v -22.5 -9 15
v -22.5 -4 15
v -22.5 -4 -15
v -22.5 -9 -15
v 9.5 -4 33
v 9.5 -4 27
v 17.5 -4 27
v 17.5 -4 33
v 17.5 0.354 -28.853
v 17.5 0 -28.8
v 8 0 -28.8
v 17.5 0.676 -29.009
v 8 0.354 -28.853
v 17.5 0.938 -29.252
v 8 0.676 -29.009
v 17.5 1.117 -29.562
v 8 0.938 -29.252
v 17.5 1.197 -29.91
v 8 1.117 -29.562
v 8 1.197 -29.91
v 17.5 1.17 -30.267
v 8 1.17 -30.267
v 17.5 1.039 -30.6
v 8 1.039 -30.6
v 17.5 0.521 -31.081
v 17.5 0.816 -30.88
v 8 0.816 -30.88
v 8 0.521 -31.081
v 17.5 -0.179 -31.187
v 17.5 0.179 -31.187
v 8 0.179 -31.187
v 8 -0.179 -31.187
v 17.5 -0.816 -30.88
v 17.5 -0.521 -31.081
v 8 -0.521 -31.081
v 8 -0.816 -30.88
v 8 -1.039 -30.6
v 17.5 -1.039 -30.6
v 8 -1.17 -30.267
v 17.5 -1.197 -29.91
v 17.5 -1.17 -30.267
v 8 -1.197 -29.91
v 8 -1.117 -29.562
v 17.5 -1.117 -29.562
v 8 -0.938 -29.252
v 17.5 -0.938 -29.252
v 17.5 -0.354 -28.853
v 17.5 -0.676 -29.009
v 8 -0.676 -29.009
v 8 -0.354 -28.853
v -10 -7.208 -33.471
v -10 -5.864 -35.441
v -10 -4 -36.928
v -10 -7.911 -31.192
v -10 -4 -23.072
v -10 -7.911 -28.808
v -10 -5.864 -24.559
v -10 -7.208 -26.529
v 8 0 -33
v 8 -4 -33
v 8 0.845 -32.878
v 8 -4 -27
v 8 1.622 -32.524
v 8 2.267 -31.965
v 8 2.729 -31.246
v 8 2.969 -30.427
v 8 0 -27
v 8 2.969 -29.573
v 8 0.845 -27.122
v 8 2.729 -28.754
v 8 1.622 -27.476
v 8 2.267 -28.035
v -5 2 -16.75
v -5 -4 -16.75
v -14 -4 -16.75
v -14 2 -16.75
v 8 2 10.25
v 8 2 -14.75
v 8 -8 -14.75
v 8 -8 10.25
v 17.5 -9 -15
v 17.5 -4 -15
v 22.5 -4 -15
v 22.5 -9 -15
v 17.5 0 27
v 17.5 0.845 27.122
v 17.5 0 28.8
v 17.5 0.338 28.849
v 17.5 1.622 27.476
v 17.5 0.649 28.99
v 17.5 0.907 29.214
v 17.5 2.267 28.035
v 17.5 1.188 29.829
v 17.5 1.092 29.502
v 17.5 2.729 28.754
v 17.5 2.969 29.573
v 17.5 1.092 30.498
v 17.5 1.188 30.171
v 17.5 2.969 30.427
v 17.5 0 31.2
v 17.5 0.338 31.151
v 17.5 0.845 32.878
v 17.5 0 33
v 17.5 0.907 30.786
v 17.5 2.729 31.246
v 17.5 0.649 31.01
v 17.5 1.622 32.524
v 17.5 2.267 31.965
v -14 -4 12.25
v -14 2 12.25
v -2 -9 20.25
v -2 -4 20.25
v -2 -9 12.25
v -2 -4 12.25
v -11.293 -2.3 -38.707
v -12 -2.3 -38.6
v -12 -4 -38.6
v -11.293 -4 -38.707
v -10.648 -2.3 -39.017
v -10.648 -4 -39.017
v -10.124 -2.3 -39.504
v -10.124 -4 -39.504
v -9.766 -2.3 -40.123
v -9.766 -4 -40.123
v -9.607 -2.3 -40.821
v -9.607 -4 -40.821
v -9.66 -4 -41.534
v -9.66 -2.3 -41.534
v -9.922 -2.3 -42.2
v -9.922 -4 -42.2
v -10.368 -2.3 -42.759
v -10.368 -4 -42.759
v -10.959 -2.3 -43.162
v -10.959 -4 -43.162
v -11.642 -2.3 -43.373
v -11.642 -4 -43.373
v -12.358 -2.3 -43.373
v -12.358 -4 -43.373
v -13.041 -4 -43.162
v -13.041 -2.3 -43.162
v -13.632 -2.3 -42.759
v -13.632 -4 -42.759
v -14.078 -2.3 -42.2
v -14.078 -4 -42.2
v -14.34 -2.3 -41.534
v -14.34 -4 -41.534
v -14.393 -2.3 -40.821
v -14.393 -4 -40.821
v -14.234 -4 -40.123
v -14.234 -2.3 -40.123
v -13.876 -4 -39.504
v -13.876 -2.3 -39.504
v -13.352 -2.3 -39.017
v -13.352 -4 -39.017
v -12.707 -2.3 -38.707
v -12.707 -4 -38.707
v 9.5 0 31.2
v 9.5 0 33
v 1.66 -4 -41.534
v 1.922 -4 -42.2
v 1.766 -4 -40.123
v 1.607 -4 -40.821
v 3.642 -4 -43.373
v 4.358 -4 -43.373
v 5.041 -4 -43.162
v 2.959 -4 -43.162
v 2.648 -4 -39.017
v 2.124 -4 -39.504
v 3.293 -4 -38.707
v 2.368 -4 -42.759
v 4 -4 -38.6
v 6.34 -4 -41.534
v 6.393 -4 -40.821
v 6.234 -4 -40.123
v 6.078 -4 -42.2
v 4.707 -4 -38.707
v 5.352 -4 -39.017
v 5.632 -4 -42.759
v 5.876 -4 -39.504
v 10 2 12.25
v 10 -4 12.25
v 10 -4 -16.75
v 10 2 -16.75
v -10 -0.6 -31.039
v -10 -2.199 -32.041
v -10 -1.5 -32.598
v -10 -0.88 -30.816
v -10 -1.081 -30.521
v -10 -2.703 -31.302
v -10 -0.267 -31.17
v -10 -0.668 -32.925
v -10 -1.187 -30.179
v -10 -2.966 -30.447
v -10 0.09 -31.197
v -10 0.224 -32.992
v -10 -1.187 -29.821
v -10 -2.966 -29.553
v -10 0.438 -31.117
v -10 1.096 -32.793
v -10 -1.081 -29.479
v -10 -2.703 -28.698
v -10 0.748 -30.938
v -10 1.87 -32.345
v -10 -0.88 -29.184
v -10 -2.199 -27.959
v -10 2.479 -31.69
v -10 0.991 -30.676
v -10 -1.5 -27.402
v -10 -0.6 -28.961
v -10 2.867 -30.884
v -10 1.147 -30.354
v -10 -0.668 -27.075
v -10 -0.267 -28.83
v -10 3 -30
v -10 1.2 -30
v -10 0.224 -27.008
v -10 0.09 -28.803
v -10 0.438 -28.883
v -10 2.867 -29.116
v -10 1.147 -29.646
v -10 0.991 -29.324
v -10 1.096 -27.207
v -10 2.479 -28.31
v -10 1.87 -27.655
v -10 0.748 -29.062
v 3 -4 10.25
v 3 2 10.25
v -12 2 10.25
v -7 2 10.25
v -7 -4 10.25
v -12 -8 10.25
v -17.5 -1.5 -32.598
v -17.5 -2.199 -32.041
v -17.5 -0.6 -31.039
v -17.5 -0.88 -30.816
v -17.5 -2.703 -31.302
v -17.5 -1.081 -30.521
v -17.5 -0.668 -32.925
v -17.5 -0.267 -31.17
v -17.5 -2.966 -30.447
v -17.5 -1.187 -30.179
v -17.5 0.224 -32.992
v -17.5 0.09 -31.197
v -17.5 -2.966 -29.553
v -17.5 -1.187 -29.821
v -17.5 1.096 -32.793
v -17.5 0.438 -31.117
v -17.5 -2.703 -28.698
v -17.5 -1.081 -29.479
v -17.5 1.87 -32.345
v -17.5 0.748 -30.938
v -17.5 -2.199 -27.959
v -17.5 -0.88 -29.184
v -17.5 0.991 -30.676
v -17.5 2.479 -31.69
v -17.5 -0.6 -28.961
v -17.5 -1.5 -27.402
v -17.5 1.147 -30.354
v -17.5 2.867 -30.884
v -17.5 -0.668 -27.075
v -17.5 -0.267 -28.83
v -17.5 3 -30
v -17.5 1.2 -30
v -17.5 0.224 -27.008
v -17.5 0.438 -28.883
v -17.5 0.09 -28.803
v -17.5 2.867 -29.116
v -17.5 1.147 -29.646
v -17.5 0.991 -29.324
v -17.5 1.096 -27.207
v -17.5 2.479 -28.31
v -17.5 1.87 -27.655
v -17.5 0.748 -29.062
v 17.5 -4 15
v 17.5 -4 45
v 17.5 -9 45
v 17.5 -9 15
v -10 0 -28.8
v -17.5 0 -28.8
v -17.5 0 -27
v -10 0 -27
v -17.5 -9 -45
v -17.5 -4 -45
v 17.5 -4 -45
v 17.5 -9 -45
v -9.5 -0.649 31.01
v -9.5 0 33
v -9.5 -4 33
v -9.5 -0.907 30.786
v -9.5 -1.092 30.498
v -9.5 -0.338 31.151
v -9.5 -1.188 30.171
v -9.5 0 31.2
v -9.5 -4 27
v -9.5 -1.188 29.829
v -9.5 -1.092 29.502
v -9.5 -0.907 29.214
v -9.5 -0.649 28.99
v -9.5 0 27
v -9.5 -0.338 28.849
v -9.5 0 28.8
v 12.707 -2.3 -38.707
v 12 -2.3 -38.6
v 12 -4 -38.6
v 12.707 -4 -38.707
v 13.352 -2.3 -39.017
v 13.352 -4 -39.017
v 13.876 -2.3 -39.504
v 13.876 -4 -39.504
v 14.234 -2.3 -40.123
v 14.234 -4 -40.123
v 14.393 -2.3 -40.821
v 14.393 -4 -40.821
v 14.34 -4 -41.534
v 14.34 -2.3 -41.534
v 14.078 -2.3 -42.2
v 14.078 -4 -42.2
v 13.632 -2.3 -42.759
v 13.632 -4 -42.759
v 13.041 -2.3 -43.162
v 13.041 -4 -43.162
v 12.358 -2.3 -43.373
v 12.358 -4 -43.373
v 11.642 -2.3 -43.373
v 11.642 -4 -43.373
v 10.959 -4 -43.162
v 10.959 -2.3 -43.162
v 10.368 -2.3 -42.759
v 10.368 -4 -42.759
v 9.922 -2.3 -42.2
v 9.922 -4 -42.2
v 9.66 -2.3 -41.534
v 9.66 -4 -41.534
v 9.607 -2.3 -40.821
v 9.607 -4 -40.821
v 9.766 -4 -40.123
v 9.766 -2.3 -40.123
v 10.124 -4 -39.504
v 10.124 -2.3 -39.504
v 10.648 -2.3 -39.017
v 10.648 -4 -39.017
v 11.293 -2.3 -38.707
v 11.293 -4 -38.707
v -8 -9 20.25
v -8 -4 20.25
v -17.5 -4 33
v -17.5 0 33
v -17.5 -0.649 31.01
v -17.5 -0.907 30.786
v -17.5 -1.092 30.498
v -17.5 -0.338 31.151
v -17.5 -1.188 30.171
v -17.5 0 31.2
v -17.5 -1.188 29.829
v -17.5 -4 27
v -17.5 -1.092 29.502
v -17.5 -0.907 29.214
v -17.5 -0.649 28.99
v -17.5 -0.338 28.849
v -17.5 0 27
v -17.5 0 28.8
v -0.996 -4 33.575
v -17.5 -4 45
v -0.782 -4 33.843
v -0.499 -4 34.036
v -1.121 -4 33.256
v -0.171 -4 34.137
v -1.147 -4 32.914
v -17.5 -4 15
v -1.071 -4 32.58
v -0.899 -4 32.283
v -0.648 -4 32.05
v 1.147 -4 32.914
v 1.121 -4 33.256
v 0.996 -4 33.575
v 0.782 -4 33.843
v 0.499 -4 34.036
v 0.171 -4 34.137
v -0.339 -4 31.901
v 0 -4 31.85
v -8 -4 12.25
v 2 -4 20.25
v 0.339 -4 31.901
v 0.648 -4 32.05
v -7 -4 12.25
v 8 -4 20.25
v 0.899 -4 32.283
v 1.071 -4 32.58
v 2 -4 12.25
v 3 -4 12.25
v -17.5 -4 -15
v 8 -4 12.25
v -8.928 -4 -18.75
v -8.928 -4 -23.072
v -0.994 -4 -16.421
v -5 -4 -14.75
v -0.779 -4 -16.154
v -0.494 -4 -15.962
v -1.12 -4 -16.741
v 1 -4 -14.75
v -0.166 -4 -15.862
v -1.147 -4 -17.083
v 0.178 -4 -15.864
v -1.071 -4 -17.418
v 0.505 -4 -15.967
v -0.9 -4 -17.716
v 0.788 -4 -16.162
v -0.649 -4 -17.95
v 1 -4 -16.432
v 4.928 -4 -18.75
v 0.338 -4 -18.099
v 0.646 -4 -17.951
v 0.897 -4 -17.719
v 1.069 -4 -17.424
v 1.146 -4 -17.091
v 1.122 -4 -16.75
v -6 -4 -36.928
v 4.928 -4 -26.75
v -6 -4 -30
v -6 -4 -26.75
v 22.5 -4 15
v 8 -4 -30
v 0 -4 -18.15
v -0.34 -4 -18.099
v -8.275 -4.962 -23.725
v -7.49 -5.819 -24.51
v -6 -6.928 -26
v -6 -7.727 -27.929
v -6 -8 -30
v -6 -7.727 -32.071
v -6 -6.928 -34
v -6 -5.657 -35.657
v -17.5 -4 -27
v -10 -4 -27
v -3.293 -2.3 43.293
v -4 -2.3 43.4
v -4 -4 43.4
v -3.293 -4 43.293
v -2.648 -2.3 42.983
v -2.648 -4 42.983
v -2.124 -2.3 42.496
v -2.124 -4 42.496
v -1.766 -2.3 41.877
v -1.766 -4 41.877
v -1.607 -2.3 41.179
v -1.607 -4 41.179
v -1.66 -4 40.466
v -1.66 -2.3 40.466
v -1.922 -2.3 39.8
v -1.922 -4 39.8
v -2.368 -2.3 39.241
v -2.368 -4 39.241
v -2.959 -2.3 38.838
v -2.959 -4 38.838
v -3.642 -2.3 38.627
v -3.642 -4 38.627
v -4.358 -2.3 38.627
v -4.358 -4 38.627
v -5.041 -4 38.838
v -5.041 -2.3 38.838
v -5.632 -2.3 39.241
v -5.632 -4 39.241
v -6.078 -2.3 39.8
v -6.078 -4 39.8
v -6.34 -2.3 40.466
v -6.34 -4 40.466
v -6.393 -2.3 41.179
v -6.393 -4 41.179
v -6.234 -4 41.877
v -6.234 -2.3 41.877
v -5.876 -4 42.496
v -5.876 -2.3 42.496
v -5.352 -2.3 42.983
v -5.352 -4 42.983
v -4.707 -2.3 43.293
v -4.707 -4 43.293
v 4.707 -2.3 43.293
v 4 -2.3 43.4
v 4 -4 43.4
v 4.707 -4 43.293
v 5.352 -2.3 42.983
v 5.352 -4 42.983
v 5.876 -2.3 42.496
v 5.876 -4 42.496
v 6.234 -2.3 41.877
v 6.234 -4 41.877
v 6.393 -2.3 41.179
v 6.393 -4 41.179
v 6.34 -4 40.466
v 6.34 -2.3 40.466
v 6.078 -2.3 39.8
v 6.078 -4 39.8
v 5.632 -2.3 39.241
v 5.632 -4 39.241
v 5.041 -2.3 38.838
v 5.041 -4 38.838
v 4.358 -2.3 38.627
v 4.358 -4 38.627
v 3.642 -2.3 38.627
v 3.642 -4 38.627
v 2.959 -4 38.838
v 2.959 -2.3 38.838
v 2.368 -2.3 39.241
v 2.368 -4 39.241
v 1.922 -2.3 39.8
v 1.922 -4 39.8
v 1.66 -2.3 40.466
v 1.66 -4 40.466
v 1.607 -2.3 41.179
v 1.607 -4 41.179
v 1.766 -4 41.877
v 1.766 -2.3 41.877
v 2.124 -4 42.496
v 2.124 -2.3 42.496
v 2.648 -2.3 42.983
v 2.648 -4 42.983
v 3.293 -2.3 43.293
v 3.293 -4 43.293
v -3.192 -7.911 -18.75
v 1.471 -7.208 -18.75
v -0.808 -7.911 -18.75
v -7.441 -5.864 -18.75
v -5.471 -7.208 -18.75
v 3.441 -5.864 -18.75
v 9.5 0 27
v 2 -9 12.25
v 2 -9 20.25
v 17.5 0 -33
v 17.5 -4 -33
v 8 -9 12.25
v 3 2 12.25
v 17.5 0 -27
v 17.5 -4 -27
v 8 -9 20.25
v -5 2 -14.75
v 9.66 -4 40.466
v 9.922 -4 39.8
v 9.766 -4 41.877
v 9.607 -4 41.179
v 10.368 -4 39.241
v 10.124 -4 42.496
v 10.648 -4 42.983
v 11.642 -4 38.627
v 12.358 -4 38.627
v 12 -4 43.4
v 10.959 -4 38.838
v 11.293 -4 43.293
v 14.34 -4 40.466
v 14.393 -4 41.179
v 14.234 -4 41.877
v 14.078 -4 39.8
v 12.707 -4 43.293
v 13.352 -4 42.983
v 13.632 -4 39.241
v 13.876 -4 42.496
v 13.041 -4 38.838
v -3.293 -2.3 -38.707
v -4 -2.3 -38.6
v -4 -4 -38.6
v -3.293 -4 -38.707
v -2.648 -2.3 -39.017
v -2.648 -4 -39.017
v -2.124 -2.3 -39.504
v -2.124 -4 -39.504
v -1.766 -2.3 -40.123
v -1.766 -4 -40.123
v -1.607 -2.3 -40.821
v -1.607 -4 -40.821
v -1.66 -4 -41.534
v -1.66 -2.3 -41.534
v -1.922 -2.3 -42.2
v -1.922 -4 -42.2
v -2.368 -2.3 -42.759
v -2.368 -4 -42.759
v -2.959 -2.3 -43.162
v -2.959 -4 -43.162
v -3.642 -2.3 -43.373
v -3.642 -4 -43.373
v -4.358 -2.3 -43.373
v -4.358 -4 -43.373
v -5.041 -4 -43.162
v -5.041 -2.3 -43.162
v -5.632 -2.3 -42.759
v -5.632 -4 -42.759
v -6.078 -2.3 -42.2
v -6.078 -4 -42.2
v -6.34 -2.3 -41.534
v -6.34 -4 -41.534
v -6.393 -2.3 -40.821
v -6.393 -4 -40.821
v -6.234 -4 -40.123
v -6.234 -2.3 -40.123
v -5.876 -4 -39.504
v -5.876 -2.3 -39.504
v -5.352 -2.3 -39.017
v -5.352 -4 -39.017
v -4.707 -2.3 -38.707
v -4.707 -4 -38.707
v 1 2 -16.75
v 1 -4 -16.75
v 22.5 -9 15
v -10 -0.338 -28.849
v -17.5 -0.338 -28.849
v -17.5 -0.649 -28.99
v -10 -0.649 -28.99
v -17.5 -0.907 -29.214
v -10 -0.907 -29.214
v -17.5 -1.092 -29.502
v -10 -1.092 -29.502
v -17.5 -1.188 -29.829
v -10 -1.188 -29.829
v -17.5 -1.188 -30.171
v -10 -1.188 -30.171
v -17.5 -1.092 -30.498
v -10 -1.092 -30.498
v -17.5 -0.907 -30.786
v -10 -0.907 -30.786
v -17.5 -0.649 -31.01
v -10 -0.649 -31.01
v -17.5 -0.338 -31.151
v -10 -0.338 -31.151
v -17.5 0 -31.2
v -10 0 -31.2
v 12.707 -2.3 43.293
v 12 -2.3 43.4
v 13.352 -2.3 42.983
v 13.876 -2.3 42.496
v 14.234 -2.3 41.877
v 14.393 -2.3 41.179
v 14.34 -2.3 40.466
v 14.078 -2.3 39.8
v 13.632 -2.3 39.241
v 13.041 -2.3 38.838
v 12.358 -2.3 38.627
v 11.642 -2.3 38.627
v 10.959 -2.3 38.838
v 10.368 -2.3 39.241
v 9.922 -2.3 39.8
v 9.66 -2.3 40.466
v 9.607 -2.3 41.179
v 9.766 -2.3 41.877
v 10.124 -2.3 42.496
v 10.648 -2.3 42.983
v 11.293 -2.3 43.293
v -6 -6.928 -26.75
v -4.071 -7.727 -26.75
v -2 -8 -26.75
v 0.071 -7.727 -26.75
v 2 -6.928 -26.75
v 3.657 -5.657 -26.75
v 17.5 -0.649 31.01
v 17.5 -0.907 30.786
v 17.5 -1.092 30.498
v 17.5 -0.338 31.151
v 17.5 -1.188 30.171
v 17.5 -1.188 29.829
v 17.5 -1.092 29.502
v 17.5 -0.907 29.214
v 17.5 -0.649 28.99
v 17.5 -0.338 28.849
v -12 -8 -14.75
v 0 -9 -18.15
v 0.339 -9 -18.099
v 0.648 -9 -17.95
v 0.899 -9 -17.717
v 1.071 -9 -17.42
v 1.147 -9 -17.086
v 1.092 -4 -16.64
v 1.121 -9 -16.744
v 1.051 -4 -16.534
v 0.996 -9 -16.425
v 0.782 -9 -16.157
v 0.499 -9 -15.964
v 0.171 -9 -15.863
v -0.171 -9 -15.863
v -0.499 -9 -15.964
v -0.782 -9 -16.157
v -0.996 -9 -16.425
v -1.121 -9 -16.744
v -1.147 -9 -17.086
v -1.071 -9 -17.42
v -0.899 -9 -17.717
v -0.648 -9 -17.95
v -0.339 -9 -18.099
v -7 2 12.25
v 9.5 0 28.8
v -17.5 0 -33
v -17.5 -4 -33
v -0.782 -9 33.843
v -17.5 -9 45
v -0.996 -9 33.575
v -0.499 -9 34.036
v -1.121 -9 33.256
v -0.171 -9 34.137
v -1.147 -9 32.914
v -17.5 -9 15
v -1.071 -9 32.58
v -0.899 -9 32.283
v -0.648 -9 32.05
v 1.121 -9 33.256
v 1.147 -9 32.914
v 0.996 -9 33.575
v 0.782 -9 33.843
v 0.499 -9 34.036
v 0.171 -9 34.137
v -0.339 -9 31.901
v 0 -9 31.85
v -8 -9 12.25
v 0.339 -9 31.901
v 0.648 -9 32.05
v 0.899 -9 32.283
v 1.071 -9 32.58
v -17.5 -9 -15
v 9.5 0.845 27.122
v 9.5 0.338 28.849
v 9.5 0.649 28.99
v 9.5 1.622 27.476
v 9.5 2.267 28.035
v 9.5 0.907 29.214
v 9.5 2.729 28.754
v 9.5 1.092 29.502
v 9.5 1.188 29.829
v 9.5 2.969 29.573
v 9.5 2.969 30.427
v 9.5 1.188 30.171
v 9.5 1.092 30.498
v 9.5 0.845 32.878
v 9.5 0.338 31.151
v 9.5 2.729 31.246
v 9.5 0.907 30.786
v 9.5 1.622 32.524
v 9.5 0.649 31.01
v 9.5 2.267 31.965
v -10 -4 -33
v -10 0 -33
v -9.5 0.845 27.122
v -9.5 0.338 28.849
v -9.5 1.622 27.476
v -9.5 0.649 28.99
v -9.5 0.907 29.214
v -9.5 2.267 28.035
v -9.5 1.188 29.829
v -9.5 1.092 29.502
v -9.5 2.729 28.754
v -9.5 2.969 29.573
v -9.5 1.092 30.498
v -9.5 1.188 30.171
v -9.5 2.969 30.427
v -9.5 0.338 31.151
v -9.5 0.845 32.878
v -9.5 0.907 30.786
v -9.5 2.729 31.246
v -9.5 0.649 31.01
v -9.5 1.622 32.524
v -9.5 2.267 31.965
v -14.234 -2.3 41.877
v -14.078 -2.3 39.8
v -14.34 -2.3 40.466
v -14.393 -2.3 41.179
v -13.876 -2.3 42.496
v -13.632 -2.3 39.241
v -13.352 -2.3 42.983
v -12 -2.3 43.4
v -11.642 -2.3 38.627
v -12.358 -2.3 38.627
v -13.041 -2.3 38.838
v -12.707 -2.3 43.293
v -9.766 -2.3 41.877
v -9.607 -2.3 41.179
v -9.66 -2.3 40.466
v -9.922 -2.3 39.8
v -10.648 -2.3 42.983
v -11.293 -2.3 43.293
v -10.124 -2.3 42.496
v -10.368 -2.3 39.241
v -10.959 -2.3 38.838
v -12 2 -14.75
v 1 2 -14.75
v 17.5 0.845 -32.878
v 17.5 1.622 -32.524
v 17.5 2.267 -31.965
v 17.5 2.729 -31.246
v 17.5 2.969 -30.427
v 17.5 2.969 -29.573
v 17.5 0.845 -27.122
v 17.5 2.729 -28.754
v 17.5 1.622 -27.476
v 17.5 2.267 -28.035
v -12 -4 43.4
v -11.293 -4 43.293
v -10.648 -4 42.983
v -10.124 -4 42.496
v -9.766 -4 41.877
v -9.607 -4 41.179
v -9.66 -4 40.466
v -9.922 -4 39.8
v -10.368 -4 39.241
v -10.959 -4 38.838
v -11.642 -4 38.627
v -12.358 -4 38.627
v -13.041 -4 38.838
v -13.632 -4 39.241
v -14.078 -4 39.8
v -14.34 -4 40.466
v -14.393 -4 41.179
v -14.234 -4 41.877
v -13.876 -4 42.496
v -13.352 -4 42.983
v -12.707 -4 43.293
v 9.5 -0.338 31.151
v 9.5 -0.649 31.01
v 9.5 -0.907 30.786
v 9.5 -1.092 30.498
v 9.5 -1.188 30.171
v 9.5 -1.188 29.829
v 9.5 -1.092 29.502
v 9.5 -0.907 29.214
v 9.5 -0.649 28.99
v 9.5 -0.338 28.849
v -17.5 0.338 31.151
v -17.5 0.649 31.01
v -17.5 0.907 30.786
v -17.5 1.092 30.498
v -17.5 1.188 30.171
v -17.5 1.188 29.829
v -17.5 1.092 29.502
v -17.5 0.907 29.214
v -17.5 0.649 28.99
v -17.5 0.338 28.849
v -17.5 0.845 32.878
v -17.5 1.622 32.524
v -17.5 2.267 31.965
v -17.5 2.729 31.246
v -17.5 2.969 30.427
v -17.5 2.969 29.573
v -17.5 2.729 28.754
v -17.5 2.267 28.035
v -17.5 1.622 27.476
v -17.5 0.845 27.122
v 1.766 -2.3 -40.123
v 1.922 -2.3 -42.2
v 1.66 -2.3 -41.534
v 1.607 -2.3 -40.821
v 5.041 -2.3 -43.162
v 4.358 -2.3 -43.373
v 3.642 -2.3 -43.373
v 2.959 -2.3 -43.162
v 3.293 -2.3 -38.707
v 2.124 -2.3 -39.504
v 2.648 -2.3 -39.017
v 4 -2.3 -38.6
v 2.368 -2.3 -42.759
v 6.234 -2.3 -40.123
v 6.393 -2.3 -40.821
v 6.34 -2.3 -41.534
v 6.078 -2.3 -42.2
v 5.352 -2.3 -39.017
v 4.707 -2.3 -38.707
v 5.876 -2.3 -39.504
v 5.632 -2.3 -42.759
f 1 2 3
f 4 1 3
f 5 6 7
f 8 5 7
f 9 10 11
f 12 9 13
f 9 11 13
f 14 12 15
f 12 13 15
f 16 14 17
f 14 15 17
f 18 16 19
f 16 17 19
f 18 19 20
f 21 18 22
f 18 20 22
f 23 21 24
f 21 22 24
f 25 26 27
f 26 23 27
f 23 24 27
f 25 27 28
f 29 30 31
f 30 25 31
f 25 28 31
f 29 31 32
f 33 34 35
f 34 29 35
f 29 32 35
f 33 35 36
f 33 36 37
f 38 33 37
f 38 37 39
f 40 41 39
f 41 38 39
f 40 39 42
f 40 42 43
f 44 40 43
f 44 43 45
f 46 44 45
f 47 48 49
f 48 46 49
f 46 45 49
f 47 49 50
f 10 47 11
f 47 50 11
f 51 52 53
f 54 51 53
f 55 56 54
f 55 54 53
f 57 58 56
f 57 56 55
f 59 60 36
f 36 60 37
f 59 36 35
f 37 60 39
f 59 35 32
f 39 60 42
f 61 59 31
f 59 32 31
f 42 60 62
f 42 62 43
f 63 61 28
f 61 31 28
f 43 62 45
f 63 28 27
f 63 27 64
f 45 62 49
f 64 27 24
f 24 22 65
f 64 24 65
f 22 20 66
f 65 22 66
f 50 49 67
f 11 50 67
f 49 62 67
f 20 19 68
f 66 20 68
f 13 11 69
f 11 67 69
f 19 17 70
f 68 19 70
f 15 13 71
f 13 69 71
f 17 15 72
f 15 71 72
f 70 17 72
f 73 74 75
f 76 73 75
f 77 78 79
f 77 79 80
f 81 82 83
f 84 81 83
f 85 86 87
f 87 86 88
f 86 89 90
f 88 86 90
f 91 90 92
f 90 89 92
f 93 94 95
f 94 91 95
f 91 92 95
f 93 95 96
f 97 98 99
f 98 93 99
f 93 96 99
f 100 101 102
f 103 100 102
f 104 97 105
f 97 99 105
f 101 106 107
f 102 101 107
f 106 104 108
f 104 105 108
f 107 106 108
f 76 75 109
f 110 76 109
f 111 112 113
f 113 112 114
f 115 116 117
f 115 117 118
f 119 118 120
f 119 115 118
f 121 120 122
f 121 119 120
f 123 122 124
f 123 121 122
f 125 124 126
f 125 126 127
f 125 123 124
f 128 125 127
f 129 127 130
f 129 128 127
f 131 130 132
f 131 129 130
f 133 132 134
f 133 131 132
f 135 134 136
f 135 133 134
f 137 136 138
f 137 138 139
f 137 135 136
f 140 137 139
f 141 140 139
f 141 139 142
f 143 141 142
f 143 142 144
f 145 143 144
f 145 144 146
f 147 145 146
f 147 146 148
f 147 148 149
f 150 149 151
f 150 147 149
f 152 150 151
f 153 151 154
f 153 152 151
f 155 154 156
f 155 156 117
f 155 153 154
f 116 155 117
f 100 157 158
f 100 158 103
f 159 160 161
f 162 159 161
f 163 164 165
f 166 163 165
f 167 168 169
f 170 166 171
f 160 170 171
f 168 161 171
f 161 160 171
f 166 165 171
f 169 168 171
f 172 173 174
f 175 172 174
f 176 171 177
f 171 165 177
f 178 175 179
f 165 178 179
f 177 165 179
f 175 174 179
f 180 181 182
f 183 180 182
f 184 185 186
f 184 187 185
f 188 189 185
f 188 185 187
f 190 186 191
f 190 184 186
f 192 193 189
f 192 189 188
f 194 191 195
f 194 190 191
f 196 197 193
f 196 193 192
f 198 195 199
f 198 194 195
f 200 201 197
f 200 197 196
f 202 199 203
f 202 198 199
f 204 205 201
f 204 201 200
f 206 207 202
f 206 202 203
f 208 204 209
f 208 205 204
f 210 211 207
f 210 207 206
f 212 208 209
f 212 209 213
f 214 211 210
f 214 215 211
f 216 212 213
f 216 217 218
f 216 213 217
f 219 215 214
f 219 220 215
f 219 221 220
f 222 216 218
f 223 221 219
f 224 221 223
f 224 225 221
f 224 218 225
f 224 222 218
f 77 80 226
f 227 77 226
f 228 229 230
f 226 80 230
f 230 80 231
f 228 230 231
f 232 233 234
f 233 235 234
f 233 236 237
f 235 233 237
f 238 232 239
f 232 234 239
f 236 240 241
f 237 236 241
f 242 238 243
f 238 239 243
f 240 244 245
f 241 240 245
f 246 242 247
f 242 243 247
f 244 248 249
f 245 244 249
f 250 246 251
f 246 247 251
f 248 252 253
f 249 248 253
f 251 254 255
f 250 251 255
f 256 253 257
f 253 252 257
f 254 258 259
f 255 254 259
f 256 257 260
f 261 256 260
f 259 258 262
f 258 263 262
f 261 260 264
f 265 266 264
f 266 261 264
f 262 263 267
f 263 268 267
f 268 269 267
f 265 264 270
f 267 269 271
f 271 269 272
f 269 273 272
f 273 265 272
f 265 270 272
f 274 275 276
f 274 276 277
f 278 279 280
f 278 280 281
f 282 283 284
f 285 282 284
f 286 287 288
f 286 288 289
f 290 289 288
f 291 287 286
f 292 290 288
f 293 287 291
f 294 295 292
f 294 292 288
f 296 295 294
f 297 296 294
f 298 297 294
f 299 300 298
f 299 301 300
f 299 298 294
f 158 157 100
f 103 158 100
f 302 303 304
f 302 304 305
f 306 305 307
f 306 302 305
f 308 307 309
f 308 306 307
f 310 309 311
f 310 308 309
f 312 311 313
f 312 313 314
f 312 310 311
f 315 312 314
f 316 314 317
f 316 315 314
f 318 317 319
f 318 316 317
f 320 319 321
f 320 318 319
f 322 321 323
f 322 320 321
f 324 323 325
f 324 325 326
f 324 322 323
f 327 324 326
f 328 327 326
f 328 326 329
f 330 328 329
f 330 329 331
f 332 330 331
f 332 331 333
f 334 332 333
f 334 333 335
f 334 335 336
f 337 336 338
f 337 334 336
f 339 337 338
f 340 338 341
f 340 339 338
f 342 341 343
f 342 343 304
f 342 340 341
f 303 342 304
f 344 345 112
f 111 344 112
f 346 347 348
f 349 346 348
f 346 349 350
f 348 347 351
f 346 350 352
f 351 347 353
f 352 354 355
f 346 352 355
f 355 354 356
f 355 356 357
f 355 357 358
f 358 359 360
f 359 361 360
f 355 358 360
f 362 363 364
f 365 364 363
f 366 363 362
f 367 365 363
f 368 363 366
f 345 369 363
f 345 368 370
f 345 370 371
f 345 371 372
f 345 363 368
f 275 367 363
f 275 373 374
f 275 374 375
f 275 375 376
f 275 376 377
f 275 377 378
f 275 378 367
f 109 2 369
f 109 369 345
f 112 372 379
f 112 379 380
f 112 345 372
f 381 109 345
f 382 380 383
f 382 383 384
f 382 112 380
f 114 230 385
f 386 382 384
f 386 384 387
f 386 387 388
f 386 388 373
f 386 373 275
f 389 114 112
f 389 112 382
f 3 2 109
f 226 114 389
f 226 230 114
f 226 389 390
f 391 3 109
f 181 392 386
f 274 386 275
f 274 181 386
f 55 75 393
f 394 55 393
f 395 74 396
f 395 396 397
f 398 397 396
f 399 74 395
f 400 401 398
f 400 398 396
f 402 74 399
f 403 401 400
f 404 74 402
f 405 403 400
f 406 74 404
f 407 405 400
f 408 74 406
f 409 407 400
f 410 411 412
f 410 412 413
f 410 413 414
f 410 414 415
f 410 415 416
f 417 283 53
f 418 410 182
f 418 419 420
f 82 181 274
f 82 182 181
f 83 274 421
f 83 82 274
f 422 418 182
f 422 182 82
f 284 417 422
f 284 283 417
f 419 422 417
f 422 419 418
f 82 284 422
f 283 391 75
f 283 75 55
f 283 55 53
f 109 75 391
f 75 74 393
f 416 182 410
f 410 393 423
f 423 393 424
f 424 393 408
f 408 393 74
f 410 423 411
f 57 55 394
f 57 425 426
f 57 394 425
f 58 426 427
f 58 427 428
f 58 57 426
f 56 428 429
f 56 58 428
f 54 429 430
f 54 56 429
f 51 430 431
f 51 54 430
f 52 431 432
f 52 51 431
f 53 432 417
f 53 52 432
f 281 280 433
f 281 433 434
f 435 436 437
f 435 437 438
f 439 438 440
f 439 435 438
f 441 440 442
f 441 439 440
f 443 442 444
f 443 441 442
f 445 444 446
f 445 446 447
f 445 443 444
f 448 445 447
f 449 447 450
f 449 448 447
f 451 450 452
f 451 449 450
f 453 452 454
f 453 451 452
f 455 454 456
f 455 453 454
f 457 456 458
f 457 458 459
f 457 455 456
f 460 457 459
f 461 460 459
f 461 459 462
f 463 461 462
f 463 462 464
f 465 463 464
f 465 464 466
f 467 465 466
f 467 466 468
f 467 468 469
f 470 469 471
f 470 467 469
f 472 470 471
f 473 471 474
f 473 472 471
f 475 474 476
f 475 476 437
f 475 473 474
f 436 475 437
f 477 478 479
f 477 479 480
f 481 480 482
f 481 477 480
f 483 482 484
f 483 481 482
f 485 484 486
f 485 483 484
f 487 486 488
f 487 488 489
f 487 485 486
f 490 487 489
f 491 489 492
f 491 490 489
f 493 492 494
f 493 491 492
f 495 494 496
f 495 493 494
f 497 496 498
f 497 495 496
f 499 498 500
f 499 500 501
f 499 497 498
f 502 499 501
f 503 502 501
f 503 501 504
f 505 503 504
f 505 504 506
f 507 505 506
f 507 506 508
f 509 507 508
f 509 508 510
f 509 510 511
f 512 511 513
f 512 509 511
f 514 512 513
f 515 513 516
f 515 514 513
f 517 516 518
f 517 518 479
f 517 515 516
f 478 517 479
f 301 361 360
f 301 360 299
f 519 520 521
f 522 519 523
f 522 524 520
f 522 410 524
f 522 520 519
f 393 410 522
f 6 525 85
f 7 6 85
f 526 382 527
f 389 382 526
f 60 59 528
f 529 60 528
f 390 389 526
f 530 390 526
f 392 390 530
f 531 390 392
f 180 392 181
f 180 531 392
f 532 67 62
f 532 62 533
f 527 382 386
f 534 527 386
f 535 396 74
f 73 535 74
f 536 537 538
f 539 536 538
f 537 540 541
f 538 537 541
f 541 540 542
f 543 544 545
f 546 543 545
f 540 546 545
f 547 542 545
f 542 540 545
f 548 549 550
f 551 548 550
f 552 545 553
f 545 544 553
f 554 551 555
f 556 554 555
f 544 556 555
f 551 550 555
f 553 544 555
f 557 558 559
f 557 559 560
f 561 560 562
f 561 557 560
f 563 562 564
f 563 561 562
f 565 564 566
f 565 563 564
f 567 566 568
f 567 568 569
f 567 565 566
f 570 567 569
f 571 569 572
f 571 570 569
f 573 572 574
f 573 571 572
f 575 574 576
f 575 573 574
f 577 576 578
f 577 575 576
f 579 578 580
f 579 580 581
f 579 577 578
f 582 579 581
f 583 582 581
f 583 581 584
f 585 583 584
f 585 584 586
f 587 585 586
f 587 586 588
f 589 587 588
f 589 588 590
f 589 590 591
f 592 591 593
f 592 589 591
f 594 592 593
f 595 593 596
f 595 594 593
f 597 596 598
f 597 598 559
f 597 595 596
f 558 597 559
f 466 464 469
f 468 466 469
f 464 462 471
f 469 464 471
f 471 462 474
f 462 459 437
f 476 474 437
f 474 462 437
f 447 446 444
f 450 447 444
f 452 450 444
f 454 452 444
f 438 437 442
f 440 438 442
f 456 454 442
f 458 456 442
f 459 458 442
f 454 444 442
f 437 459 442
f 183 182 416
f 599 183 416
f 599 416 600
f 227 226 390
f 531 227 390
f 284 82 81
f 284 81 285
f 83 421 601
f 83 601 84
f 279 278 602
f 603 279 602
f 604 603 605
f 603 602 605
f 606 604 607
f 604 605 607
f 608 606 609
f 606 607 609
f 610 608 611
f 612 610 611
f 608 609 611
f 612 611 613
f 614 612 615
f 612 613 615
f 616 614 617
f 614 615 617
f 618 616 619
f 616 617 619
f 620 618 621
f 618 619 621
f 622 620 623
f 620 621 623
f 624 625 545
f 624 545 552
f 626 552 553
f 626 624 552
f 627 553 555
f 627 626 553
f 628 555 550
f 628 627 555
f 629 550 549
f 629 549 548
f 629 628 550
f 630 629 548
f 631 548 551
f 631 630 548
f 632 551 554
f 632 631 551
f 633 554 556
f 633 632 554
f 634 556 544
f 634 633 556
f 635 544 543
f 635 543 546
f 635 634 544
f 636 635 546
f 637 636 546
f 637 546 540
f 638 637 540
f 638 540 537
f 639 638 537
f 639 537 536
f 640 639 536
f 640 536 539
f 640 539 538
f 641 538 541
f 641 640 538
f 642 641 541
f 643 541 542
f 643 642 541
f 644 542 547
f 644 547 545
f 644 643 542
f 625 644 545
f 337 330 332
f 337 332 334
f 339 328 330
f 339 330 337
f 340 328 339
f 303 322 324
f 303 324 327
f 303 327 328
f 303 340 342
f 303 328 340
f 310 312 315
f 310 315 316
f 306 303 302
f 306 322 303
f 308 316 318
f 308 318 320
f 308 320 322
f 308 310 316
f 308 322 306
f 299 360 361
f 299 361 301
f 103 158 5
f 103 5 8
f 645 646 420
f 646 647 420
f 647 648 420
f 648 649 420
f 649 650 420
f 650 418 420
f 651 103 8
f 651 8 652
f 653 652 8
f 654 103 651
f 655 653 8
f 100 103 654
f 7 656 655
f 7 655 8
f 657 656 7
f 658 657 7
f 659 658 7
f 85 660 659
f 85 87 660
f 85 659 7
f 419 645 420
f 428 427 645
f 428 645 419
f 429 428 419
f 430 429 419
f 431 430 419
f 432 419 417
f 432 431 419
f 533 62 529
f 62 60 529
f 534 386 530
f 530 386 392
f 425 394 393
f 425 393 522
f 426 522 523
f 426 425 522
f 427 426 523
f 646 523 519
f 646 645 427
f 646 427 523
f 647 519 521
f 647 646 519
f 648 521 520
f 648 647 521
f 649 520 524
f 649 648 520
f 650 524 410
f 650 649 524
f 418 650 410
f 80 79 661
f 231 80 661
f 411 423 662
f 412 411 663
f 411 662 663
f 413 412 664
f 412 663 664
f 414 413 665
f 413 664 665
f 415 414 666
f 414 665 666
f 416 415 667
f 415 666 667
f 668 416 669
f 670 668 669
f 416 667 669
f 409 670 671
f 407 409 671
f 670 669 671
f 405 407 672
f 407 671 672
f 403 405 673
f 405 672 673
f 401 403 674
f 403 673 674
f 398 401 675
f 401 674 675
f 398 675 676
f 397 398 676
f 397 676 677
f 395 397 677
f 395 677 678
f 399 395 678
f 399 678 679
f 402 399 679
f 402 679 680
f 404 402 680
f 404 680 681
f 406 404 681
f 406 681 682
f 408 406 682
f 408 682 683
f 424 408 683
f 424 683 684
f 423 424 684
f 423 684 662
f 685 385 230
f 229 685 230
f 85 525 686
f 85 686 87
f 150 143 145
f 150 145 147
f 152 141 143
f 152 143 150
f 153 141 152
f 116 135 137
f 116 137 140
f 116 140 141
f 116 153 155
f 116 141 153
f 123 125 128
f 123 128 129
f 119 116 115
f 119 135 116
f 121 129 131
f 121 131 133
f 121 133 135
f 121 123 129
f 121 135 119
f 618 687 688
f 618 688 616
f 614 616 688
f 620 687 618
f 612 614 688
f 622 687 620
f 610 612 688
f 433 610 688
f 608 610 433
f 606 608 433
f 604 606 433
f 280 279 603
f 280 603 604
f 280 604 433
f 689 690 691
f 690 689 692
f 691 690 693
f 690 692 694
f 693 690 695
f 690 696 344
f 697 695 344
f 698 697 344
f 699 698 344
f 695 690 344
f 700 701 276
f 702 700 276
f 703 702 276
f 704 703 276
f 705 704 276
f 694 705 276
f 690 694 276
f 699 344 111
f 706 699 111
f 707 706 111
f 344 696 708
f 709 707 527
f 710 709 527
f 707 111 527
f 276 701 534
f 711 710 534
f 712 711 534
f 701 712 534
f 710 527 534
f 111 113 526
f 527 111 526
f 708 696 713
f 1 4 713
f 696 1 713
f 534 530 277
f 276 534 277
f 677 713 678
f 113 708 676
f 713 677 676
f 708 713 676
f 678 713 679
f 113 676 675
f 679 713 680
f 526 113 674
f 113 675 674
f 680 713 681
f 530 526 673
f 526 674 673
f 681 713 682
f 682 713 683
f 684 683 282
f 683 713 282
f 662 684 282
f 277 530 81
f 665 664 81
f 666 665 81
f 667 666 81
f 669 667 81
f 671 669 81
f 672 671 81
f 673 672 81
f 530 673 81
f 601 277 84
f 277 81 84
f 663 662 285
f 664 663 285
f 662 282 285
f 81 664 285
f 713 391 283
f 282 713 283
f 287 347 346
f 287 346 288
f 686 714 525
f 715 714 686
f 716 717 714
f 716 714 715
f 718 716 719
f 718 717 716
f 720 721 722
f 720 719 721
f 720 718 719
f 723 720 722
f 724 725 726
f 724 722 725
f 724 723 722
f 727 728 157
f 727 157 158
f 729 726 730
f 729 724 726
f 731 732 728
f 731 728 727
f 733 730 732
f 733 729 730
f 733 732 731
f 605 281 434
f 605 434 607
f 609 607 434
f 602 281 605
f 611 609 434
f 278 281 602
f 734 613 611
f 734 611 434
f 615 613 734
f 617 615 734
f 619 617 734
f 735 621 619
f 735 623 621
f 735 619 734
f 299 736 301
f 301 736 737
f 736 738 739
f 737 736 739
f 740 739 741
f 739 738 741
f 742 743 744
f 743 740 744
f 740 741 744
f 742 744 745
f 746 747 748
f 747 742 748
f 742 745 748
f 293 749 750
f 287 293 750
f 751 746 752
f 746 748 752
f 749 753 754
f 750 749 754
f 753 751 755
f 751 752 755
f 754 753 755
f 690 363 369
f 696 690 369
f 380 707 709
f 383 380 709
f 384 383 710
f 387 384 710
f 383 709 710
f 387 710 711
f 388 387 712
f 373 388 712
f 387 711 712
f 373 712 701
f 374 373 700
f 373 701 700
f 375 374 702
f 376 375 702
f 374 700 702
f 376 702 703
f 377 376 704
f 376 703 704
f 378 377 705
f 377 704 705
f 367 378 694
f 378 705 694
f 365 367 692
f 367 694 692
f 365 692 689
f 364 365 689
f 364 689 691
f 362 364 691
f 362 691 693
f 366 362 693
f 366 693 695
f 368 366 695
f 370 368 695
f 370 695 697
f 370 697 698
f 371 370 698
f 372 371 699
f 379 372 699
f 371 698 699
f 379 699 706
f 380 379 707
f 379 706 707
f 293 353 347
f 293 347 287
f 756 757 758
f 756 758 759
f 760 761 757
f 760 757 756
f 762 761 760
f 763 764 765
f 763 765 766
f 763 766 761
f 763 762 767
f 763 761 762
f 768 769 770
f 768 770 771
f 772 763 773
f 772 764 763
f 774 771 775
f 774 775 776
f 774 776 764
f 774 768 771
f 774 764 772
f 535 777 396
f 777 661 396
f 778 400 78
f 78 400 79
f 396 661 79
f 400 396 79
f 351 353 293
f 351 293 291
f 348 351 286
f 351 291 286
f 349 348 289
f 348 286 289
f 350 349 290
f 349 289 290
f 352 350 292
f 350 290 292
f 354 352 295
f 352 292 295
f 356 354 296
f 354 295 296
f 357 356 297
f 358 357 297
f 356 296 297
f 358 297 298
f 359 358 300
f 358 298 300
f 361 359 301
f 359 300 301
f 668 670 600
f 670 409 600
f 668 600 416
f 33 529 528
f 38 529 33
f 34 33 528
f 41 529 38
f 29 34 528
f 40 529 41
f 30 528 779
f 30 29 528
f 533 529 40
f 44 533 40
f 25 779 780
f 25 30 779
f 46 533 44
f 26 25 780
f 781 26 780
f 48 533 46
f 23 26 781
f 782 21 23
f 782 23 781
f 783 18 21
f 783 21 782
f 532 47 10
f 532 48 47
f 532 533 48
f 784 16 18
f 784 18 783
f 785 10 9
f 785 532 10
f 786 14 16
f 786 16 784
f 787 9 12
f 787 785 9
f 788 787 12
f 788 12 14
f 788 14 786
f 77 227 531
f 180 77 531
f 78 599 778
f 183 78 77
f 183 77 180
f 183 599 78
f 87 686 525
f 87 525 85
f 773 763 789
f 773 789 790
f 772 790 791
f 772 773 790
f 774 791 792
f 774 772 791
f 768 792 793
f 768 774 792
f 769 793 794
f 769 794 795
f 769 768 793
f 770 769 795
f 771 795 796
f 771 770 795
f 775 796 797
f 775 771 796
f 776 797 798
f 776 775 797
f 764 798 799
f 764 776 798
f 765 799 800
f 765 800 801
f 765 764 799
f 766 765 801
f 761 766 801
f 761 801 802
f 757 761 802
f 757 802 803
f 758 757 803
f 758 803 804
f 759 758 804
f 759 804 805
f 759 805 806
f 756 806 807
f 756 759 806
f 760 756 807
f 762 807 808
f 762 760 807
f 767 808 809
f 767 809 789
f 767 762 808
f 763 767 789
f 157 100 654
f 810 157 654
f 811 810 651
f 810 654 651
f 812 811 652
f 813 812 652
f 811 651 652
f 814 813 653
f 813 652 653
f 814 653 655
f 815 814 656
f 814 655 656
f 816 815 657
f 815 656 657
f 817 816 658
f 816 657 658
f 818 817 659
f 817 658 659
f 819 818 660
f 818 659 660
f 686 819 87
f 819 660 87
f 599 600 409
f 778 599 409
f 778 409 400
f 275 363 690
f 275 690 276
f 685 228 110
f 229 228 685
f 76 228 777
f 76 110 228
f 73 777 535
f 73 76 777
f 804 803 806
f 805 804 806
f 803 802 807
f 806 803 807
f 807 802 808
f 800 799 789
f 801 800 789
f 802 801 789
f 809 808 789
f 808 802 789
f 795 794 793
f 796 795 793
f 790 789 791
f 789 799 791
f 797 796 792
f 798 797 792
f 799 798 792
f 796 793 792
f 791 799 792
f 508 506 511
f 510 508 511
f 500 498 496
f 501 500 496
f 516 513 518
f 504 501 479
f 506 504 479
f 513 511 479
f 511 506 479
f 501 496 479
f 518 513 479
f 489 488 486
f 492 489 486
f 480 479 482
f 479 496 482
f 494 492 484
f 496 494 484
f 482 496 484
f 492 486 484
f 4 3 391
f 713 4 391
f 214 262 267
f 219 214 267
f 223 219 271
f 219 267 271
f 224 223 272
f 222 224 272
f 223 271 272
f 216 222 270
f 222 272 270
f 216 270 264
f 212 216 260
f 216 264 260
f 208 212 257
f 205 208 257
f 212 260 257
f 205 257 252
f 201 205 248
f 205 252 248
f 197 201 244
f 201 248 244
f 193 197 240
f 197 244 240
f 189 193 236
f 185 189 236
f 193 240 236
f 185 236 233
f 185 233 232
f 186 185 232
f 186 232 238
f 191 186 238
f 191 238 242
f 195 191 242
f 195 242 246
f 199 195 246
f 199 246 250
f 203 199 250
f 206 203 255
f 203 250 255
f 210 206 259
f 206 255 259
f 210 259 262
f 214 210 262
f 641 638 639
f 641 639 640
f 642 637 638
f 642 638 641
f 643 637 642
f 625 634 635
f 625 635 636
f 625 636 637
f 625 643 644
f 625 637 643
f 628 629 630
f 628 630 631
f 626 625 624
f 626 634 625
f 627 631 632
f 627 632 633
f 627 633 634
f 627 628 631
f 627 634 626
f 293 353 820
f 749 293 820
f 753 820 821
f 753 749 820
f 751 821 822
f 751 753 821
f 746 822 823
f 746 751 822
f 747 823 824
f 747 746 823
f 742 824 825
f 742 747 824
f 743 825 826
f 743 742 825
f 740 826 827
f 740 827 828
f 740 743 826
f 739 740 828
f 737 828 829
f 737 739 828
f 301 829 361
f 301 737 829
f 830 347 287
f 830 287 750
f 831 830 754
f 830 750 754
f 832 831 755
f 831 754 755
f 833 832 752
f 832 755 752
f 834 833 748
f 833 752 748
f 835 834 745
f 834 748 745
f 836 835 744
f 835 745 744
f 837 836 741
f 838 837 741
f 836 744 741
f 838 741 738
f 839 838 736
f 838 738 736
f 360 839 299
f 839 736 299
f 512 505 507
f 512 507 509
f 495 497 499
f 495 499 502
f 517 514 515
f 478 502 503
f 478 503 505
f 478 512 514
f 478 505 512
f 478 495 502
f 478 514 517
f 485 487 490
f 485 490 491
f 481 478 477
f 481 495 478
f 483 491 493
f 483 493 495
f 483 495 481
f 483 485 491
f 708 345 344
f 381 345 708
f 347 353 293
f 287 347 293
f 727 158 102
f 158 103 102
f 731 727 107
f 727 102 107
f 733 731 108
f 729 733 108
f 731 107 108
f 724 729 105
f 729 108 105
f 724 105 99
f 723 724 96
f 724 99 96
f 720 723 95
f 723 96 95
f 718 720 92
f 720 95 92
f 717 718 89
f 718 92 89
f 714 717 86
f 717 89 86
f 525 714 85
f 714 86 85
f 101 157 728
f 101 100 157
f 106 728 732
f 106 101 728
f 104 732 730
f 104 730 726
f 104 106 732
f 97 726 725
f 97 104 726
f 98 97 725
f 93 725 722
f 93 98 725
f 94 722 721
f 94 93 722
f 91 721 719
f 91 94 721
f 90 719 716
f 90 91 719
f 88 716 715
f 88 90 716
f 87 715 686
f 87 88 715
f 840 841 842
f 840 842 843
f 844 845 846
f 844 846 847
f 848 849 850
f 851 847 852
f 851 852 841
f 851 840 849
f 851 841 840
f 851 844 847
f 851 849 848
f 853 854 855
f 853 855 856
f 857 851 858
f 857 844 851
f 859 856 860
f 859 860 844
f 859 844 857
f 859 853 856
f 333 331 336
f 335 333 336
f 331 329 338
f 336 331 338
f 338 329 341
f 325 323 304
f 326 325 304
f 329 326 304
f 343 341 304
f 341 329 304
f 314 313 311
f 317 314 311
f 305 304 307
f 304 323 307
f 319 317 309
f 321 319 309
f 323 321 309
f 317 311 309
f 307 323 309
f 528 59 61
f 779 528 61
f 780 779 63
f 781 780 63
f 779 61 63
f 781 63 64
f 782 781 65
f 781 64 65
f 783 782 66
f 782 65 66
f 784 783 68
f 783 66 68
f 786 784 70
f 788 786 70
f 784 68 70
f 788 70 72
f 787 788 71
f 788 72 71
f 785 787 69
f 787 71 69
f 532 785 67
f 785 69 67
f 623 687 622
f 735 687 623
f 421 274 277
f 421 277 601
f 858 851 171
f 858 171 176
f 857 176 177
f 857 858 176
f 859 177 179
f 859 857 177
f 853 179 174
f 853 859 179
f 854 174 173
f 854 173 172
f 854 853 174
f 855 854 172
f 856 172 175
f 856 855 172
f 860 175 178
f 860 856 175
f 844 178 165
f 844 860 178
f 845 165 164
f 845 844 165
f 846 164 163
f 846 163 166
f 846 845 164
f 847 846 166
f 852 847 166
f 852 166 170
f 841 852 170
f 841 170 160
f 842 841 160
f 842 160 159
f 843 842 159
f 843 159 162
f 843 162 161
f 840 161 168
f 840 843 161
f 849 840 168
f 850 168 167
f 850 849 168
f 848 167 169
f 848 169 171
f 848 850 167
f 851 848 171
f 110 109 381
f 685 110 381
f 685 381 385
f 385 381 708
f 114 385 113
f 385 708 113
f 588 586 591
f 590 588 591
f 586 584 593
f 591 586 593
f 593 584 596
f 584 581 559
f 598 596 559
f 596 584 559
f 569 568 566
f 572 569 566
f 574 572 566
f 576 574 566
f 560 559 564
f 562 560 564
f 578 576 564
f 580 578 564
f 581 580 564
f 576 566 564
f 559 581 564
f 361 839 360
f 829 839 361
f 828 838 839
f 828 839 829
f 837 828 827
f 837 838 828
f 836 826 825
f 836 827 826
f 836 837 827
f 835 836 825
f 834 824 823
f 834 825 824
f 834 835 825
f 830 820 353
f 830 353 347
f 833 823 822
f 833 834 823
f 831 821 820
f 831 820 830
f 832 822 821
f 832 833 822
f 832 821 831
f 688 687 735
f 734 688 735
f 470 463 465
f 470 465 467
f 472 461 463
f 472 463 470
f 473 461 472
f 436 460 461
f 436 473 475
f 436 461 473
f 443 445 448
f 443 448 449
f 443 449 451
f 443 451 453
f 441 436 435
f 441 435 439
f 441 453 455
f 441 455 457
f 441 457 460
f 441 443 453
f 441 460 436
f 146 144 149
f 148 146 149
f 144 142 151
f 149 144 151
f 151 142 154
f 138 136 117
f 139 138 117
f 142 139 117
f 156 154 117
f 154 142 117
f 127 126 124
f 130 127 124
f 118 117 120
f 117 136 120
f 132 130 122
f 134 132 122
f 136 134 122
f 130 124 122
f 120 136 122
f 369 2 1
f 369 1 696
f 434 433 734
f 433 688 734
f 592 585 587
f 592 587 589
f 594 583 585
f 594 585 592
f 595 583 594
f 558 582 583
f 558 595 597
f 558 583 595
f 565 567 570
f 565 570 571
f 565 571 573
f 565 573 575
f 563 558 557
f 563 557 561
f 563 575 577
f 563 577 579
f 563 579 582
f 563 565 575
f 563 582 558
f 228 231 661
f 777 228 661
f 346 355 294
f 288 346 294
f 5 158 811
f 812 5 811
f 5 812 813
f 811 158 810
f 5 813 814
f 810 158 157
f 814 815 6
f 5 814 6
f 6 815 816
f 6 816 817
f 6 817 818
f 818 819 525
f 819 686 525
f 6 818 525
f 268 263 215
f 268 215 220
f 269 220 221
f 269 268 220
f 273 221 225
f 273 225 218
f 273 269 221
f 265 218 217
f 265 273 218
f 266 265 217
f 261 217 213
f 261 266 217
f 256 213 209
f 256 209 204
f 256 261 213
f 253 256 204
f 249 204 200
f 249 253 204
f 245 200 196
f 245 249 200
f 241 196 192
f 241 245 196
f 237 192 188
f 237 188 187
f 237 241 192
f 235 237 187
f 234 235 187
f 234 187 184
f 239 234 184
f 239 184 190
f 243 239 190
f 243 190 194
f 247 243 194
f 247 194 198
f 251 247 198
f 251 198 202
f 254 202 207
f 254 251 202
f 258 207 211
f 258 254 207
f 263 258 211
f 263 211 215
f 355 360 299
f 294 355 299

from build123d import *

# Parameters (mm, degrees)
SKETCH1_W             = 9.5
SKETCH1_H             = 1.8
SKETCH1_H_2           = 1.2
SKETCH1_H_3           = 3
SKETCH1_W_2           = 7.5
SKETCH1_W_3           = 8
SKETCH1_H_4           = 6
BOSS_EXTRUDE1_DEPTH   = 4
SKETCH1_3_W           = 8
SKETCH1_3_H           = 1.8
REVOLVE1_ANGLE        = 180
REVOLVE2_START        = -17.5
REVOLVE2_OUTLINE_R    = 3
REVOLVE2_OUTLINE_R_2  = 1.2
REVOLVE2_DEPTH        = 7.5
REVOLVE2_START_2      = 8
REVOLVE2_2_DEPTH      = 9.5
SKETCH1_6_W           = 7.5
SKETCH1_6_H           = 1.2
SKETCH1_6_W_2         = 9.5
BOSS_EXTRUDE2_START   = -4
SKETCH1_7_W           = 35
SKETCH1_7_H           = 90
SKETCH1_7_W_2         = 5
SKETCH1_7_H_2         = 30
BOSS_EXTRUDE2_DEPTH   = 5
SKETCH1_9_W           = 8
SKETCH1_9_H           = 1.2
SKETCH1_10_W          = 4
SKETCH1_10_H          = 3
SKETCH1_10_W_2        = 14
SKETCH1_10_H_2        = 1
CUT_EXTRUDE2_DEPTH    = 4
SKETCH9_R             = 1.15
CUT_EXTRUDE4_DEPTH    = 5
SKETCH10_W            = 6
SKETCH10_H            = 8
CUT_EXTRUDE5_DEPTH    = 5
BOSS_EXTRUDE3_DEPTH   = 6
BOSS_EXTRUDE4_START   = -2.3
SKETCH1_12_R          = 2.4
BOSS_EXTRUDE4_DEPTH   = 1.7
BOSS_EXTRUDE4_2_DEPTH = 1.7
BOSS_EXTRUDE4_3_DEPTH = 1.7
BOSS_EXTRUDE4_4_DEPTH = 1.7
BOSS_EXTRUDE4_5_DEPTH = 1.7
BOSS_EXTRUDE4_6_DEPTH = 1.7
BOSS_EXTRUDE4_7_DEPTH = 1.7
BOSS_EXTRUDE4_8_DEPTH = 1.7
SKETCH11_W            = 8
SKETCH11_H            = 8


# Read off the part's stored shape, not the designer's step: Revolve2
with BuildPart() as part:
    # Sketch1 → Boss-Extrude1 (new body)
    with BuildSketch(Plane(origin=(0, 0, 0), x_dir=(1, 0, 0), z_dir=(0, 1, 0))):
        with Locations((12.75, 27.9)):
            Rectangle(SKETCH1_W, SKETCH1_H)
        with Locations((12.75, 29.4)):
            Rectangle(SKETCH1_W, SKETCH1_H_2)
        with Locations((12.75, 31.5)):
            Rectangle(SKETCH1_W, SKETCH1_H_3)
        with Locations((-13.75, 27.9)):
            Rectangle(SKETCH1_W_2, SKETCH1_H)
        with Locations((-13.75, 29.4)):
            Rectangle(SKETCH1_W_2, SKETCH1_H_2)
        with Locations((-13.75, 31.5)):
            Rectangle(SKETCH1_W_2, SKETCH1_H_3)
        with Locations((13.5, -30)):
            Rectangle(SKETCH1_W_3, SKETCH1_H_4)
        with Locations((-13.5, -30)):
            Rectangle(SKETCH1_W_3, SKETCH1_H_4)
    extrude(amount=-BOSS_EXTRUDE1_DEPTH)

    # Revolve2 2 outline → Revolve2 2 (add)
    with BuildSketch(Plane.YZ.offset(REVOLVE2_START_2)):
        with BuildLine():
            Line((0, -27), (0, -28.8))
            ThreePointArc((0, -28.8), (1.2, -30), (0, -31.2))
            Line((0, -31.2), (0, -33))
            ThreePointArc((0, -33), (3, -30), (0, -27))
        make_face()
    extrude(amount=REVOLVE2_2_DEPTH)

    # Sketch1<6> → Cut-Revolve2 (revolve, cut)
    with BuildSketch(Plane(origin=(0, 0, 0), x_dir=(1, 0, 0), z_dir=(0, 1, 0))):
        with Locations((-13.75, 29.4)):
            Rectangle(SKETCH1_6_W, SKETCH1_6_H)
        with Locations((12.75, 29.4)):
            Rectangle(SKETCH1_6_W_2, SKETCH1_6_H)
        Polygon((-6, 30), (-10, 30), (-10, 28.8), (8, 28.8), (8, 30), align=None)
    revolve(axis=Axis((-17.5, 0, -30), (1, 0, 0)), mode=Mode.SUBTRACT)

    # Sketch1<9> → Cut-Revolve7 (revolve, cut)
    with BuildSketch(Plane(origin=(0, 0, 0), x_dir=(1, 0, 0), z_dir=(0, 1, 0))):
        with Locations((-13.5, -30.6)):
            Rectangle(SKETCH1_9_W, SKETCH1_9_H)
        with Locations((13.5, -30.6)):
            Rectangle(SKETCH1_9_W, SKETCH1_9_H)
    revolve(axis=Axis((-17.5, 0, 30), (1, 0, 0)), mode=Mode.SUBTRACT)


with BuildPart() as body_2:
    # Sketch1<3> → Revolve1 (revolve)
    with BuildSketch(Plane(origin=(0, 0, 0), x_dir=(1, 0, 0), z_dir=(0, 1, 0))):
        with Locations((-13.5, -32.1)):
            Rectangle(SKETCH1_3_W, SKETCH1_3_H)
        with Locations((13.5, -32.1)):
            Rectangle(SKETCH1_3_W, SKETCH1_3_H)
    revolve(axis=Axis((-17.5, 0, 30), (-1, 0, 0)), revolution_arc=REVOLVE1_ANGLE)


with BuildPart() as body_3:
    # Revolve2 outline → Revolve2 (new body)
    with BuildSketch(Plane.YZ.offset(REVOLVE2_START)):
        with Locations((0, -30)):
            Circle(REVOLVE2_OUTLINE_R)
        with Locations((0, -30)):
            Circle(REVOLVE2_OUTLINE_R_2, mode=Mode.SUBTRACT)
    extrude(amount=REVOLVE2_DEPTH)


with BuildPart() as body_4:
    # Sketch1<7> → Boss-Extrude2 (new body)
    with BuildSketch(Plane(origin=(0, 0, 0), x_dir=(1, 0, 0), z_dir=(0, 1, 0)).offset(BOSS_EXTRUDE2_START)):
        Rectangle(SKETCH1_7_W, SKETCH1_7_H)
        with Locations((-20, 0)):
            Rectangle(SKETCH1_7_W_2, SKETCH1_7_H_2)
        with Locations((20, 0)):
            Rectangle(SKETCH1_7_W_2, SKETCH1_7_H_2)
    extrude(amount=-BOSS_EXTRUDE2_DEPTH)

    # Sketch1<10> → Cut-Revolve8 (revolve, cut)
    with BuildSketch(Plane(origin=(0, 0, 0), x_dir=(1, 0, 0), z_dir=(0, 1, 0)), mode=Mode.PRIVATE) as cut_revolve8_sk:
        Polygon((-10, 38), (-10, 33), (-6, 33), (-6, 34), (-6, 38), align=None)
        with Locations((-8, 31.5)):
            Rectangle(SKETCH1_10_W, SKETCH1_10_H)
        with Locations((1, 33.5)):
            Rectangle(SKETCH1_10_W_2, SKETCH1_10_H_2)
        with Locations((1, 31.5)):
            Rectangle(SKETCH1_10_W_2, SKETCH1_10_H)
    revolve(cut_revolve8_sk.sketch.rotate(Axis((-17.5, 0, -30), (1, 0, 0)), 180), axis=Axis((-17.5, 0, -30), (1, 0, 0)), mode=Mode.SUBTRACT)

    # Sketch4 → Cut-Extrude2 (cut)
    with BuildSketch(Plane(origin=(0, -4, 0), x_dir=(1, 0, 0), z_dir=(0, 1, 0))):
        Polygon((-12, 14.75), (-5, 14.75), (8, 14.75), (8, -10.25), (-12, -10.25), align=None)
    extrude(amount=-CUT_EXTRUDE2_DEPTH, mode=Mode.SUBTRACT)

    # Sketch9 → Cut-Extrude4 (cut)
    with BuildSketch(Plane.XZ.offset(9)):
        with Locations(Location((0, 33, 0), (0, 0, 270))):
            Circle(SKETCH9_R)
        with Locations(Location((0, -17, 0), (0, 0, 270))):
            Circle(SKETCH9_R)
    extrude(amount=-CUT_EXTRUDE4_DEPTH, mode=Mode.SUBTRACT)

    # Sketch10 → Cut-Extrude5 (cut)
    with BuildSketch(Plane(origin=(0, -4, 0), x_dir=(1, 0, 0), z_dir=(0, 1, 0))):
        with Locations((-5, -16.25)):
            Rectangle(SKETCH10_W, SKETCH10_H)
        with Locations((5, -16.25)):
            Rectangle(SKETCH10_W, SKETCH10_H)
    extrude(amount=-CUT_EXTRUDE5_DEPTH, mode=Mode.SUBTRACT)

    # Sketch4<6> → Boss-Extrude3 (add)
    with BuildSketch(Plane(origin=(0, -4, 0), x_dir=(1, 0, 0), z_dir=(0, 1, 0))):
        Polygon((-12, -10.25), (-12, 14.75), (-5, 14.75), (-5, 16.75), (-14, 16.75), (-14, -12.25), (-7, -12.25), (-7, -10.25), align=None)
        Polygon((1, 16.75), (1, 14.75), (8, 14.75), (8, -10.25), (3, -10.25), (3, -12.25), (10, -12.25), (10, 16.75), align=None)
    extrude(amount=BOSS_EXTRUDE3_DEPTH)

    # Sketch11 → Cut-Revolve9 (revolve, cut)
    with BuildSketch(Plane(origin=(0, 0, 0), x_dir=(1, 0, 0), z_dir=(0, 1, 0))):
        with Locations((2, 22.75)):
            Rectangle(SKETCH11_W, SKETCH11_H)
    revolve(axis=Axis((-2, 0, -26.75), (0, 0, 1)), mode=Mode.SUBTRACT)


with BuildPart() as body_5:
    # Sketch1<12> → Boss-Extrude4 (new body)
    with BuildSketch(Plane(origin=(0, 0, 0), x_dir=(1, 0, 0), z_dir=(0, 1, 0)).offset(BOSS_EXTRUDE4_START)):
        with Locations(Location((-4, 41, 0), (0, 0, 270))):
            Circle(SKETCH1_12_R)
    extrude(amount=-BOSS_EXTRUDE4_DEPTH)


with BuildPart() as body_6:
    # Sketch1<12> → Boss-Extrude4 2 (new body)
    with BuildSketch(Plane(origin=(0, 0, 0), x_dir=(1, 0, 0), z_dir=(0, 1, 0)).offset(BOSS_EXTRUDE4_START)):
        with Locations(Location((4, 41, 0), (0, 0, 270))):
            Circle(SKETCH1_12_R)
    extrude(amount=-BOSS_EXTRUDE4_2_DEPTH)


with BuildPart() as body_7:
    # Sketch1<12> → Boss-Extrude4 3 (new body)
    with BuildSketch(Plane(origin=(0, 0, 0), x_dir=(1, 0, 0), z_dir=(0, 1, 0)).offset(BOSS_EXTRUDE4_START)):
        with Locations(Location((-12, 41, 0), (0, 0, 270))):
            Circle(SKETCH1_12_R)
    extrude(amount=-BOSS_EXTRUDE4_3_DEPTH)


with BuildPart() as body_8:
    # Sketch1<12> → Boss-Extrude4 4 (new body)
    with BuildSketch(Plane(origin=(0, 0, 0), x_dir=(1, 0, 0), z_dir=(0, 1, 0)).offset(BOSS_EXTRUDE4_START)):
        with Locations(Location((12, 41, 0), (0, 0, 270))):
            Circle(SKETCH1_12_R)
    extrude(amount=-BOSS_EXTRUDE4_4_DEPTH)


with BuildPart() as body_9:
    # Sketch1<12> → Boss-Extrude4 5 (new body)
    with BuildSketch(Plane(origin=(0, 0, 0), x_dir=(1, 0, 0), z_dir=(0, 1, 0)).offset(BOSS_EXTRUDE4_START)):
        with Locations(Location((12, -41, 0), (0, 0, 270))):
            Circle(SKETCH1_12_R)
    extrude(amount=-BOSS_EXTRUDE4_5_DEPTH)


with BuildPart() as body_10:
    # Sketch1<12> → Boss-Extrude4 6 (new body)
    with BuildSketch(Plane(origin=(0, 0, 0), x_dir=(1, 0, 0), z_dir=(0, 1, 0)).offset(BOSS_EXTRUDE4_START)):
        with Locations(Location((4, -41, 0), (0, 0, 270))):
            Circle(SKETCH1_12_R)
    extrude(amount=-BOSS_EXTRUDE4_6_DEPTH)


with BuildPart() as body_11:
    # Sketch1<12> → Boss-Extrude4 7 (new body)
    with BuildSketch(Plane(origin=(0, 0, 0), x_dir=(1, 0, 0), z_dir=(0, 1, 0)).offset(BOSS_EXTRUDE4_START)):
        with Locations(Location((-4, -41, 0), (0, 0, 270))):
            Circle(SKETCH1_12_R)
    extrude(amount=-BOSS_EXTRUDE4_7_DEPTH)


with BuildPart() as body_12:
    # Sketch1<12> → Boss-Extrude4 8 (new body)
    with BuildSketch(Plane(origin=(0, 0, 0), x_dir=(1, 0, 0), z_dir=(0, 1, 0)).offset(BOSS_EXTRUDE4_START)):
        with Locations(Location((-12, -41, 0), (0, 0, 270))):
            Circle(SKETCH1_12_R)
    extrude(amount=-BOSS_EXTRUDE4_8_DEPTH)


solid = Compound([part.part, body_2.part, body_3.part, body_4.part, body_5.part, body_6.part, body_7.part, body_8.part, body_9.part, body_10.part, body_11.part, body_12.part])
